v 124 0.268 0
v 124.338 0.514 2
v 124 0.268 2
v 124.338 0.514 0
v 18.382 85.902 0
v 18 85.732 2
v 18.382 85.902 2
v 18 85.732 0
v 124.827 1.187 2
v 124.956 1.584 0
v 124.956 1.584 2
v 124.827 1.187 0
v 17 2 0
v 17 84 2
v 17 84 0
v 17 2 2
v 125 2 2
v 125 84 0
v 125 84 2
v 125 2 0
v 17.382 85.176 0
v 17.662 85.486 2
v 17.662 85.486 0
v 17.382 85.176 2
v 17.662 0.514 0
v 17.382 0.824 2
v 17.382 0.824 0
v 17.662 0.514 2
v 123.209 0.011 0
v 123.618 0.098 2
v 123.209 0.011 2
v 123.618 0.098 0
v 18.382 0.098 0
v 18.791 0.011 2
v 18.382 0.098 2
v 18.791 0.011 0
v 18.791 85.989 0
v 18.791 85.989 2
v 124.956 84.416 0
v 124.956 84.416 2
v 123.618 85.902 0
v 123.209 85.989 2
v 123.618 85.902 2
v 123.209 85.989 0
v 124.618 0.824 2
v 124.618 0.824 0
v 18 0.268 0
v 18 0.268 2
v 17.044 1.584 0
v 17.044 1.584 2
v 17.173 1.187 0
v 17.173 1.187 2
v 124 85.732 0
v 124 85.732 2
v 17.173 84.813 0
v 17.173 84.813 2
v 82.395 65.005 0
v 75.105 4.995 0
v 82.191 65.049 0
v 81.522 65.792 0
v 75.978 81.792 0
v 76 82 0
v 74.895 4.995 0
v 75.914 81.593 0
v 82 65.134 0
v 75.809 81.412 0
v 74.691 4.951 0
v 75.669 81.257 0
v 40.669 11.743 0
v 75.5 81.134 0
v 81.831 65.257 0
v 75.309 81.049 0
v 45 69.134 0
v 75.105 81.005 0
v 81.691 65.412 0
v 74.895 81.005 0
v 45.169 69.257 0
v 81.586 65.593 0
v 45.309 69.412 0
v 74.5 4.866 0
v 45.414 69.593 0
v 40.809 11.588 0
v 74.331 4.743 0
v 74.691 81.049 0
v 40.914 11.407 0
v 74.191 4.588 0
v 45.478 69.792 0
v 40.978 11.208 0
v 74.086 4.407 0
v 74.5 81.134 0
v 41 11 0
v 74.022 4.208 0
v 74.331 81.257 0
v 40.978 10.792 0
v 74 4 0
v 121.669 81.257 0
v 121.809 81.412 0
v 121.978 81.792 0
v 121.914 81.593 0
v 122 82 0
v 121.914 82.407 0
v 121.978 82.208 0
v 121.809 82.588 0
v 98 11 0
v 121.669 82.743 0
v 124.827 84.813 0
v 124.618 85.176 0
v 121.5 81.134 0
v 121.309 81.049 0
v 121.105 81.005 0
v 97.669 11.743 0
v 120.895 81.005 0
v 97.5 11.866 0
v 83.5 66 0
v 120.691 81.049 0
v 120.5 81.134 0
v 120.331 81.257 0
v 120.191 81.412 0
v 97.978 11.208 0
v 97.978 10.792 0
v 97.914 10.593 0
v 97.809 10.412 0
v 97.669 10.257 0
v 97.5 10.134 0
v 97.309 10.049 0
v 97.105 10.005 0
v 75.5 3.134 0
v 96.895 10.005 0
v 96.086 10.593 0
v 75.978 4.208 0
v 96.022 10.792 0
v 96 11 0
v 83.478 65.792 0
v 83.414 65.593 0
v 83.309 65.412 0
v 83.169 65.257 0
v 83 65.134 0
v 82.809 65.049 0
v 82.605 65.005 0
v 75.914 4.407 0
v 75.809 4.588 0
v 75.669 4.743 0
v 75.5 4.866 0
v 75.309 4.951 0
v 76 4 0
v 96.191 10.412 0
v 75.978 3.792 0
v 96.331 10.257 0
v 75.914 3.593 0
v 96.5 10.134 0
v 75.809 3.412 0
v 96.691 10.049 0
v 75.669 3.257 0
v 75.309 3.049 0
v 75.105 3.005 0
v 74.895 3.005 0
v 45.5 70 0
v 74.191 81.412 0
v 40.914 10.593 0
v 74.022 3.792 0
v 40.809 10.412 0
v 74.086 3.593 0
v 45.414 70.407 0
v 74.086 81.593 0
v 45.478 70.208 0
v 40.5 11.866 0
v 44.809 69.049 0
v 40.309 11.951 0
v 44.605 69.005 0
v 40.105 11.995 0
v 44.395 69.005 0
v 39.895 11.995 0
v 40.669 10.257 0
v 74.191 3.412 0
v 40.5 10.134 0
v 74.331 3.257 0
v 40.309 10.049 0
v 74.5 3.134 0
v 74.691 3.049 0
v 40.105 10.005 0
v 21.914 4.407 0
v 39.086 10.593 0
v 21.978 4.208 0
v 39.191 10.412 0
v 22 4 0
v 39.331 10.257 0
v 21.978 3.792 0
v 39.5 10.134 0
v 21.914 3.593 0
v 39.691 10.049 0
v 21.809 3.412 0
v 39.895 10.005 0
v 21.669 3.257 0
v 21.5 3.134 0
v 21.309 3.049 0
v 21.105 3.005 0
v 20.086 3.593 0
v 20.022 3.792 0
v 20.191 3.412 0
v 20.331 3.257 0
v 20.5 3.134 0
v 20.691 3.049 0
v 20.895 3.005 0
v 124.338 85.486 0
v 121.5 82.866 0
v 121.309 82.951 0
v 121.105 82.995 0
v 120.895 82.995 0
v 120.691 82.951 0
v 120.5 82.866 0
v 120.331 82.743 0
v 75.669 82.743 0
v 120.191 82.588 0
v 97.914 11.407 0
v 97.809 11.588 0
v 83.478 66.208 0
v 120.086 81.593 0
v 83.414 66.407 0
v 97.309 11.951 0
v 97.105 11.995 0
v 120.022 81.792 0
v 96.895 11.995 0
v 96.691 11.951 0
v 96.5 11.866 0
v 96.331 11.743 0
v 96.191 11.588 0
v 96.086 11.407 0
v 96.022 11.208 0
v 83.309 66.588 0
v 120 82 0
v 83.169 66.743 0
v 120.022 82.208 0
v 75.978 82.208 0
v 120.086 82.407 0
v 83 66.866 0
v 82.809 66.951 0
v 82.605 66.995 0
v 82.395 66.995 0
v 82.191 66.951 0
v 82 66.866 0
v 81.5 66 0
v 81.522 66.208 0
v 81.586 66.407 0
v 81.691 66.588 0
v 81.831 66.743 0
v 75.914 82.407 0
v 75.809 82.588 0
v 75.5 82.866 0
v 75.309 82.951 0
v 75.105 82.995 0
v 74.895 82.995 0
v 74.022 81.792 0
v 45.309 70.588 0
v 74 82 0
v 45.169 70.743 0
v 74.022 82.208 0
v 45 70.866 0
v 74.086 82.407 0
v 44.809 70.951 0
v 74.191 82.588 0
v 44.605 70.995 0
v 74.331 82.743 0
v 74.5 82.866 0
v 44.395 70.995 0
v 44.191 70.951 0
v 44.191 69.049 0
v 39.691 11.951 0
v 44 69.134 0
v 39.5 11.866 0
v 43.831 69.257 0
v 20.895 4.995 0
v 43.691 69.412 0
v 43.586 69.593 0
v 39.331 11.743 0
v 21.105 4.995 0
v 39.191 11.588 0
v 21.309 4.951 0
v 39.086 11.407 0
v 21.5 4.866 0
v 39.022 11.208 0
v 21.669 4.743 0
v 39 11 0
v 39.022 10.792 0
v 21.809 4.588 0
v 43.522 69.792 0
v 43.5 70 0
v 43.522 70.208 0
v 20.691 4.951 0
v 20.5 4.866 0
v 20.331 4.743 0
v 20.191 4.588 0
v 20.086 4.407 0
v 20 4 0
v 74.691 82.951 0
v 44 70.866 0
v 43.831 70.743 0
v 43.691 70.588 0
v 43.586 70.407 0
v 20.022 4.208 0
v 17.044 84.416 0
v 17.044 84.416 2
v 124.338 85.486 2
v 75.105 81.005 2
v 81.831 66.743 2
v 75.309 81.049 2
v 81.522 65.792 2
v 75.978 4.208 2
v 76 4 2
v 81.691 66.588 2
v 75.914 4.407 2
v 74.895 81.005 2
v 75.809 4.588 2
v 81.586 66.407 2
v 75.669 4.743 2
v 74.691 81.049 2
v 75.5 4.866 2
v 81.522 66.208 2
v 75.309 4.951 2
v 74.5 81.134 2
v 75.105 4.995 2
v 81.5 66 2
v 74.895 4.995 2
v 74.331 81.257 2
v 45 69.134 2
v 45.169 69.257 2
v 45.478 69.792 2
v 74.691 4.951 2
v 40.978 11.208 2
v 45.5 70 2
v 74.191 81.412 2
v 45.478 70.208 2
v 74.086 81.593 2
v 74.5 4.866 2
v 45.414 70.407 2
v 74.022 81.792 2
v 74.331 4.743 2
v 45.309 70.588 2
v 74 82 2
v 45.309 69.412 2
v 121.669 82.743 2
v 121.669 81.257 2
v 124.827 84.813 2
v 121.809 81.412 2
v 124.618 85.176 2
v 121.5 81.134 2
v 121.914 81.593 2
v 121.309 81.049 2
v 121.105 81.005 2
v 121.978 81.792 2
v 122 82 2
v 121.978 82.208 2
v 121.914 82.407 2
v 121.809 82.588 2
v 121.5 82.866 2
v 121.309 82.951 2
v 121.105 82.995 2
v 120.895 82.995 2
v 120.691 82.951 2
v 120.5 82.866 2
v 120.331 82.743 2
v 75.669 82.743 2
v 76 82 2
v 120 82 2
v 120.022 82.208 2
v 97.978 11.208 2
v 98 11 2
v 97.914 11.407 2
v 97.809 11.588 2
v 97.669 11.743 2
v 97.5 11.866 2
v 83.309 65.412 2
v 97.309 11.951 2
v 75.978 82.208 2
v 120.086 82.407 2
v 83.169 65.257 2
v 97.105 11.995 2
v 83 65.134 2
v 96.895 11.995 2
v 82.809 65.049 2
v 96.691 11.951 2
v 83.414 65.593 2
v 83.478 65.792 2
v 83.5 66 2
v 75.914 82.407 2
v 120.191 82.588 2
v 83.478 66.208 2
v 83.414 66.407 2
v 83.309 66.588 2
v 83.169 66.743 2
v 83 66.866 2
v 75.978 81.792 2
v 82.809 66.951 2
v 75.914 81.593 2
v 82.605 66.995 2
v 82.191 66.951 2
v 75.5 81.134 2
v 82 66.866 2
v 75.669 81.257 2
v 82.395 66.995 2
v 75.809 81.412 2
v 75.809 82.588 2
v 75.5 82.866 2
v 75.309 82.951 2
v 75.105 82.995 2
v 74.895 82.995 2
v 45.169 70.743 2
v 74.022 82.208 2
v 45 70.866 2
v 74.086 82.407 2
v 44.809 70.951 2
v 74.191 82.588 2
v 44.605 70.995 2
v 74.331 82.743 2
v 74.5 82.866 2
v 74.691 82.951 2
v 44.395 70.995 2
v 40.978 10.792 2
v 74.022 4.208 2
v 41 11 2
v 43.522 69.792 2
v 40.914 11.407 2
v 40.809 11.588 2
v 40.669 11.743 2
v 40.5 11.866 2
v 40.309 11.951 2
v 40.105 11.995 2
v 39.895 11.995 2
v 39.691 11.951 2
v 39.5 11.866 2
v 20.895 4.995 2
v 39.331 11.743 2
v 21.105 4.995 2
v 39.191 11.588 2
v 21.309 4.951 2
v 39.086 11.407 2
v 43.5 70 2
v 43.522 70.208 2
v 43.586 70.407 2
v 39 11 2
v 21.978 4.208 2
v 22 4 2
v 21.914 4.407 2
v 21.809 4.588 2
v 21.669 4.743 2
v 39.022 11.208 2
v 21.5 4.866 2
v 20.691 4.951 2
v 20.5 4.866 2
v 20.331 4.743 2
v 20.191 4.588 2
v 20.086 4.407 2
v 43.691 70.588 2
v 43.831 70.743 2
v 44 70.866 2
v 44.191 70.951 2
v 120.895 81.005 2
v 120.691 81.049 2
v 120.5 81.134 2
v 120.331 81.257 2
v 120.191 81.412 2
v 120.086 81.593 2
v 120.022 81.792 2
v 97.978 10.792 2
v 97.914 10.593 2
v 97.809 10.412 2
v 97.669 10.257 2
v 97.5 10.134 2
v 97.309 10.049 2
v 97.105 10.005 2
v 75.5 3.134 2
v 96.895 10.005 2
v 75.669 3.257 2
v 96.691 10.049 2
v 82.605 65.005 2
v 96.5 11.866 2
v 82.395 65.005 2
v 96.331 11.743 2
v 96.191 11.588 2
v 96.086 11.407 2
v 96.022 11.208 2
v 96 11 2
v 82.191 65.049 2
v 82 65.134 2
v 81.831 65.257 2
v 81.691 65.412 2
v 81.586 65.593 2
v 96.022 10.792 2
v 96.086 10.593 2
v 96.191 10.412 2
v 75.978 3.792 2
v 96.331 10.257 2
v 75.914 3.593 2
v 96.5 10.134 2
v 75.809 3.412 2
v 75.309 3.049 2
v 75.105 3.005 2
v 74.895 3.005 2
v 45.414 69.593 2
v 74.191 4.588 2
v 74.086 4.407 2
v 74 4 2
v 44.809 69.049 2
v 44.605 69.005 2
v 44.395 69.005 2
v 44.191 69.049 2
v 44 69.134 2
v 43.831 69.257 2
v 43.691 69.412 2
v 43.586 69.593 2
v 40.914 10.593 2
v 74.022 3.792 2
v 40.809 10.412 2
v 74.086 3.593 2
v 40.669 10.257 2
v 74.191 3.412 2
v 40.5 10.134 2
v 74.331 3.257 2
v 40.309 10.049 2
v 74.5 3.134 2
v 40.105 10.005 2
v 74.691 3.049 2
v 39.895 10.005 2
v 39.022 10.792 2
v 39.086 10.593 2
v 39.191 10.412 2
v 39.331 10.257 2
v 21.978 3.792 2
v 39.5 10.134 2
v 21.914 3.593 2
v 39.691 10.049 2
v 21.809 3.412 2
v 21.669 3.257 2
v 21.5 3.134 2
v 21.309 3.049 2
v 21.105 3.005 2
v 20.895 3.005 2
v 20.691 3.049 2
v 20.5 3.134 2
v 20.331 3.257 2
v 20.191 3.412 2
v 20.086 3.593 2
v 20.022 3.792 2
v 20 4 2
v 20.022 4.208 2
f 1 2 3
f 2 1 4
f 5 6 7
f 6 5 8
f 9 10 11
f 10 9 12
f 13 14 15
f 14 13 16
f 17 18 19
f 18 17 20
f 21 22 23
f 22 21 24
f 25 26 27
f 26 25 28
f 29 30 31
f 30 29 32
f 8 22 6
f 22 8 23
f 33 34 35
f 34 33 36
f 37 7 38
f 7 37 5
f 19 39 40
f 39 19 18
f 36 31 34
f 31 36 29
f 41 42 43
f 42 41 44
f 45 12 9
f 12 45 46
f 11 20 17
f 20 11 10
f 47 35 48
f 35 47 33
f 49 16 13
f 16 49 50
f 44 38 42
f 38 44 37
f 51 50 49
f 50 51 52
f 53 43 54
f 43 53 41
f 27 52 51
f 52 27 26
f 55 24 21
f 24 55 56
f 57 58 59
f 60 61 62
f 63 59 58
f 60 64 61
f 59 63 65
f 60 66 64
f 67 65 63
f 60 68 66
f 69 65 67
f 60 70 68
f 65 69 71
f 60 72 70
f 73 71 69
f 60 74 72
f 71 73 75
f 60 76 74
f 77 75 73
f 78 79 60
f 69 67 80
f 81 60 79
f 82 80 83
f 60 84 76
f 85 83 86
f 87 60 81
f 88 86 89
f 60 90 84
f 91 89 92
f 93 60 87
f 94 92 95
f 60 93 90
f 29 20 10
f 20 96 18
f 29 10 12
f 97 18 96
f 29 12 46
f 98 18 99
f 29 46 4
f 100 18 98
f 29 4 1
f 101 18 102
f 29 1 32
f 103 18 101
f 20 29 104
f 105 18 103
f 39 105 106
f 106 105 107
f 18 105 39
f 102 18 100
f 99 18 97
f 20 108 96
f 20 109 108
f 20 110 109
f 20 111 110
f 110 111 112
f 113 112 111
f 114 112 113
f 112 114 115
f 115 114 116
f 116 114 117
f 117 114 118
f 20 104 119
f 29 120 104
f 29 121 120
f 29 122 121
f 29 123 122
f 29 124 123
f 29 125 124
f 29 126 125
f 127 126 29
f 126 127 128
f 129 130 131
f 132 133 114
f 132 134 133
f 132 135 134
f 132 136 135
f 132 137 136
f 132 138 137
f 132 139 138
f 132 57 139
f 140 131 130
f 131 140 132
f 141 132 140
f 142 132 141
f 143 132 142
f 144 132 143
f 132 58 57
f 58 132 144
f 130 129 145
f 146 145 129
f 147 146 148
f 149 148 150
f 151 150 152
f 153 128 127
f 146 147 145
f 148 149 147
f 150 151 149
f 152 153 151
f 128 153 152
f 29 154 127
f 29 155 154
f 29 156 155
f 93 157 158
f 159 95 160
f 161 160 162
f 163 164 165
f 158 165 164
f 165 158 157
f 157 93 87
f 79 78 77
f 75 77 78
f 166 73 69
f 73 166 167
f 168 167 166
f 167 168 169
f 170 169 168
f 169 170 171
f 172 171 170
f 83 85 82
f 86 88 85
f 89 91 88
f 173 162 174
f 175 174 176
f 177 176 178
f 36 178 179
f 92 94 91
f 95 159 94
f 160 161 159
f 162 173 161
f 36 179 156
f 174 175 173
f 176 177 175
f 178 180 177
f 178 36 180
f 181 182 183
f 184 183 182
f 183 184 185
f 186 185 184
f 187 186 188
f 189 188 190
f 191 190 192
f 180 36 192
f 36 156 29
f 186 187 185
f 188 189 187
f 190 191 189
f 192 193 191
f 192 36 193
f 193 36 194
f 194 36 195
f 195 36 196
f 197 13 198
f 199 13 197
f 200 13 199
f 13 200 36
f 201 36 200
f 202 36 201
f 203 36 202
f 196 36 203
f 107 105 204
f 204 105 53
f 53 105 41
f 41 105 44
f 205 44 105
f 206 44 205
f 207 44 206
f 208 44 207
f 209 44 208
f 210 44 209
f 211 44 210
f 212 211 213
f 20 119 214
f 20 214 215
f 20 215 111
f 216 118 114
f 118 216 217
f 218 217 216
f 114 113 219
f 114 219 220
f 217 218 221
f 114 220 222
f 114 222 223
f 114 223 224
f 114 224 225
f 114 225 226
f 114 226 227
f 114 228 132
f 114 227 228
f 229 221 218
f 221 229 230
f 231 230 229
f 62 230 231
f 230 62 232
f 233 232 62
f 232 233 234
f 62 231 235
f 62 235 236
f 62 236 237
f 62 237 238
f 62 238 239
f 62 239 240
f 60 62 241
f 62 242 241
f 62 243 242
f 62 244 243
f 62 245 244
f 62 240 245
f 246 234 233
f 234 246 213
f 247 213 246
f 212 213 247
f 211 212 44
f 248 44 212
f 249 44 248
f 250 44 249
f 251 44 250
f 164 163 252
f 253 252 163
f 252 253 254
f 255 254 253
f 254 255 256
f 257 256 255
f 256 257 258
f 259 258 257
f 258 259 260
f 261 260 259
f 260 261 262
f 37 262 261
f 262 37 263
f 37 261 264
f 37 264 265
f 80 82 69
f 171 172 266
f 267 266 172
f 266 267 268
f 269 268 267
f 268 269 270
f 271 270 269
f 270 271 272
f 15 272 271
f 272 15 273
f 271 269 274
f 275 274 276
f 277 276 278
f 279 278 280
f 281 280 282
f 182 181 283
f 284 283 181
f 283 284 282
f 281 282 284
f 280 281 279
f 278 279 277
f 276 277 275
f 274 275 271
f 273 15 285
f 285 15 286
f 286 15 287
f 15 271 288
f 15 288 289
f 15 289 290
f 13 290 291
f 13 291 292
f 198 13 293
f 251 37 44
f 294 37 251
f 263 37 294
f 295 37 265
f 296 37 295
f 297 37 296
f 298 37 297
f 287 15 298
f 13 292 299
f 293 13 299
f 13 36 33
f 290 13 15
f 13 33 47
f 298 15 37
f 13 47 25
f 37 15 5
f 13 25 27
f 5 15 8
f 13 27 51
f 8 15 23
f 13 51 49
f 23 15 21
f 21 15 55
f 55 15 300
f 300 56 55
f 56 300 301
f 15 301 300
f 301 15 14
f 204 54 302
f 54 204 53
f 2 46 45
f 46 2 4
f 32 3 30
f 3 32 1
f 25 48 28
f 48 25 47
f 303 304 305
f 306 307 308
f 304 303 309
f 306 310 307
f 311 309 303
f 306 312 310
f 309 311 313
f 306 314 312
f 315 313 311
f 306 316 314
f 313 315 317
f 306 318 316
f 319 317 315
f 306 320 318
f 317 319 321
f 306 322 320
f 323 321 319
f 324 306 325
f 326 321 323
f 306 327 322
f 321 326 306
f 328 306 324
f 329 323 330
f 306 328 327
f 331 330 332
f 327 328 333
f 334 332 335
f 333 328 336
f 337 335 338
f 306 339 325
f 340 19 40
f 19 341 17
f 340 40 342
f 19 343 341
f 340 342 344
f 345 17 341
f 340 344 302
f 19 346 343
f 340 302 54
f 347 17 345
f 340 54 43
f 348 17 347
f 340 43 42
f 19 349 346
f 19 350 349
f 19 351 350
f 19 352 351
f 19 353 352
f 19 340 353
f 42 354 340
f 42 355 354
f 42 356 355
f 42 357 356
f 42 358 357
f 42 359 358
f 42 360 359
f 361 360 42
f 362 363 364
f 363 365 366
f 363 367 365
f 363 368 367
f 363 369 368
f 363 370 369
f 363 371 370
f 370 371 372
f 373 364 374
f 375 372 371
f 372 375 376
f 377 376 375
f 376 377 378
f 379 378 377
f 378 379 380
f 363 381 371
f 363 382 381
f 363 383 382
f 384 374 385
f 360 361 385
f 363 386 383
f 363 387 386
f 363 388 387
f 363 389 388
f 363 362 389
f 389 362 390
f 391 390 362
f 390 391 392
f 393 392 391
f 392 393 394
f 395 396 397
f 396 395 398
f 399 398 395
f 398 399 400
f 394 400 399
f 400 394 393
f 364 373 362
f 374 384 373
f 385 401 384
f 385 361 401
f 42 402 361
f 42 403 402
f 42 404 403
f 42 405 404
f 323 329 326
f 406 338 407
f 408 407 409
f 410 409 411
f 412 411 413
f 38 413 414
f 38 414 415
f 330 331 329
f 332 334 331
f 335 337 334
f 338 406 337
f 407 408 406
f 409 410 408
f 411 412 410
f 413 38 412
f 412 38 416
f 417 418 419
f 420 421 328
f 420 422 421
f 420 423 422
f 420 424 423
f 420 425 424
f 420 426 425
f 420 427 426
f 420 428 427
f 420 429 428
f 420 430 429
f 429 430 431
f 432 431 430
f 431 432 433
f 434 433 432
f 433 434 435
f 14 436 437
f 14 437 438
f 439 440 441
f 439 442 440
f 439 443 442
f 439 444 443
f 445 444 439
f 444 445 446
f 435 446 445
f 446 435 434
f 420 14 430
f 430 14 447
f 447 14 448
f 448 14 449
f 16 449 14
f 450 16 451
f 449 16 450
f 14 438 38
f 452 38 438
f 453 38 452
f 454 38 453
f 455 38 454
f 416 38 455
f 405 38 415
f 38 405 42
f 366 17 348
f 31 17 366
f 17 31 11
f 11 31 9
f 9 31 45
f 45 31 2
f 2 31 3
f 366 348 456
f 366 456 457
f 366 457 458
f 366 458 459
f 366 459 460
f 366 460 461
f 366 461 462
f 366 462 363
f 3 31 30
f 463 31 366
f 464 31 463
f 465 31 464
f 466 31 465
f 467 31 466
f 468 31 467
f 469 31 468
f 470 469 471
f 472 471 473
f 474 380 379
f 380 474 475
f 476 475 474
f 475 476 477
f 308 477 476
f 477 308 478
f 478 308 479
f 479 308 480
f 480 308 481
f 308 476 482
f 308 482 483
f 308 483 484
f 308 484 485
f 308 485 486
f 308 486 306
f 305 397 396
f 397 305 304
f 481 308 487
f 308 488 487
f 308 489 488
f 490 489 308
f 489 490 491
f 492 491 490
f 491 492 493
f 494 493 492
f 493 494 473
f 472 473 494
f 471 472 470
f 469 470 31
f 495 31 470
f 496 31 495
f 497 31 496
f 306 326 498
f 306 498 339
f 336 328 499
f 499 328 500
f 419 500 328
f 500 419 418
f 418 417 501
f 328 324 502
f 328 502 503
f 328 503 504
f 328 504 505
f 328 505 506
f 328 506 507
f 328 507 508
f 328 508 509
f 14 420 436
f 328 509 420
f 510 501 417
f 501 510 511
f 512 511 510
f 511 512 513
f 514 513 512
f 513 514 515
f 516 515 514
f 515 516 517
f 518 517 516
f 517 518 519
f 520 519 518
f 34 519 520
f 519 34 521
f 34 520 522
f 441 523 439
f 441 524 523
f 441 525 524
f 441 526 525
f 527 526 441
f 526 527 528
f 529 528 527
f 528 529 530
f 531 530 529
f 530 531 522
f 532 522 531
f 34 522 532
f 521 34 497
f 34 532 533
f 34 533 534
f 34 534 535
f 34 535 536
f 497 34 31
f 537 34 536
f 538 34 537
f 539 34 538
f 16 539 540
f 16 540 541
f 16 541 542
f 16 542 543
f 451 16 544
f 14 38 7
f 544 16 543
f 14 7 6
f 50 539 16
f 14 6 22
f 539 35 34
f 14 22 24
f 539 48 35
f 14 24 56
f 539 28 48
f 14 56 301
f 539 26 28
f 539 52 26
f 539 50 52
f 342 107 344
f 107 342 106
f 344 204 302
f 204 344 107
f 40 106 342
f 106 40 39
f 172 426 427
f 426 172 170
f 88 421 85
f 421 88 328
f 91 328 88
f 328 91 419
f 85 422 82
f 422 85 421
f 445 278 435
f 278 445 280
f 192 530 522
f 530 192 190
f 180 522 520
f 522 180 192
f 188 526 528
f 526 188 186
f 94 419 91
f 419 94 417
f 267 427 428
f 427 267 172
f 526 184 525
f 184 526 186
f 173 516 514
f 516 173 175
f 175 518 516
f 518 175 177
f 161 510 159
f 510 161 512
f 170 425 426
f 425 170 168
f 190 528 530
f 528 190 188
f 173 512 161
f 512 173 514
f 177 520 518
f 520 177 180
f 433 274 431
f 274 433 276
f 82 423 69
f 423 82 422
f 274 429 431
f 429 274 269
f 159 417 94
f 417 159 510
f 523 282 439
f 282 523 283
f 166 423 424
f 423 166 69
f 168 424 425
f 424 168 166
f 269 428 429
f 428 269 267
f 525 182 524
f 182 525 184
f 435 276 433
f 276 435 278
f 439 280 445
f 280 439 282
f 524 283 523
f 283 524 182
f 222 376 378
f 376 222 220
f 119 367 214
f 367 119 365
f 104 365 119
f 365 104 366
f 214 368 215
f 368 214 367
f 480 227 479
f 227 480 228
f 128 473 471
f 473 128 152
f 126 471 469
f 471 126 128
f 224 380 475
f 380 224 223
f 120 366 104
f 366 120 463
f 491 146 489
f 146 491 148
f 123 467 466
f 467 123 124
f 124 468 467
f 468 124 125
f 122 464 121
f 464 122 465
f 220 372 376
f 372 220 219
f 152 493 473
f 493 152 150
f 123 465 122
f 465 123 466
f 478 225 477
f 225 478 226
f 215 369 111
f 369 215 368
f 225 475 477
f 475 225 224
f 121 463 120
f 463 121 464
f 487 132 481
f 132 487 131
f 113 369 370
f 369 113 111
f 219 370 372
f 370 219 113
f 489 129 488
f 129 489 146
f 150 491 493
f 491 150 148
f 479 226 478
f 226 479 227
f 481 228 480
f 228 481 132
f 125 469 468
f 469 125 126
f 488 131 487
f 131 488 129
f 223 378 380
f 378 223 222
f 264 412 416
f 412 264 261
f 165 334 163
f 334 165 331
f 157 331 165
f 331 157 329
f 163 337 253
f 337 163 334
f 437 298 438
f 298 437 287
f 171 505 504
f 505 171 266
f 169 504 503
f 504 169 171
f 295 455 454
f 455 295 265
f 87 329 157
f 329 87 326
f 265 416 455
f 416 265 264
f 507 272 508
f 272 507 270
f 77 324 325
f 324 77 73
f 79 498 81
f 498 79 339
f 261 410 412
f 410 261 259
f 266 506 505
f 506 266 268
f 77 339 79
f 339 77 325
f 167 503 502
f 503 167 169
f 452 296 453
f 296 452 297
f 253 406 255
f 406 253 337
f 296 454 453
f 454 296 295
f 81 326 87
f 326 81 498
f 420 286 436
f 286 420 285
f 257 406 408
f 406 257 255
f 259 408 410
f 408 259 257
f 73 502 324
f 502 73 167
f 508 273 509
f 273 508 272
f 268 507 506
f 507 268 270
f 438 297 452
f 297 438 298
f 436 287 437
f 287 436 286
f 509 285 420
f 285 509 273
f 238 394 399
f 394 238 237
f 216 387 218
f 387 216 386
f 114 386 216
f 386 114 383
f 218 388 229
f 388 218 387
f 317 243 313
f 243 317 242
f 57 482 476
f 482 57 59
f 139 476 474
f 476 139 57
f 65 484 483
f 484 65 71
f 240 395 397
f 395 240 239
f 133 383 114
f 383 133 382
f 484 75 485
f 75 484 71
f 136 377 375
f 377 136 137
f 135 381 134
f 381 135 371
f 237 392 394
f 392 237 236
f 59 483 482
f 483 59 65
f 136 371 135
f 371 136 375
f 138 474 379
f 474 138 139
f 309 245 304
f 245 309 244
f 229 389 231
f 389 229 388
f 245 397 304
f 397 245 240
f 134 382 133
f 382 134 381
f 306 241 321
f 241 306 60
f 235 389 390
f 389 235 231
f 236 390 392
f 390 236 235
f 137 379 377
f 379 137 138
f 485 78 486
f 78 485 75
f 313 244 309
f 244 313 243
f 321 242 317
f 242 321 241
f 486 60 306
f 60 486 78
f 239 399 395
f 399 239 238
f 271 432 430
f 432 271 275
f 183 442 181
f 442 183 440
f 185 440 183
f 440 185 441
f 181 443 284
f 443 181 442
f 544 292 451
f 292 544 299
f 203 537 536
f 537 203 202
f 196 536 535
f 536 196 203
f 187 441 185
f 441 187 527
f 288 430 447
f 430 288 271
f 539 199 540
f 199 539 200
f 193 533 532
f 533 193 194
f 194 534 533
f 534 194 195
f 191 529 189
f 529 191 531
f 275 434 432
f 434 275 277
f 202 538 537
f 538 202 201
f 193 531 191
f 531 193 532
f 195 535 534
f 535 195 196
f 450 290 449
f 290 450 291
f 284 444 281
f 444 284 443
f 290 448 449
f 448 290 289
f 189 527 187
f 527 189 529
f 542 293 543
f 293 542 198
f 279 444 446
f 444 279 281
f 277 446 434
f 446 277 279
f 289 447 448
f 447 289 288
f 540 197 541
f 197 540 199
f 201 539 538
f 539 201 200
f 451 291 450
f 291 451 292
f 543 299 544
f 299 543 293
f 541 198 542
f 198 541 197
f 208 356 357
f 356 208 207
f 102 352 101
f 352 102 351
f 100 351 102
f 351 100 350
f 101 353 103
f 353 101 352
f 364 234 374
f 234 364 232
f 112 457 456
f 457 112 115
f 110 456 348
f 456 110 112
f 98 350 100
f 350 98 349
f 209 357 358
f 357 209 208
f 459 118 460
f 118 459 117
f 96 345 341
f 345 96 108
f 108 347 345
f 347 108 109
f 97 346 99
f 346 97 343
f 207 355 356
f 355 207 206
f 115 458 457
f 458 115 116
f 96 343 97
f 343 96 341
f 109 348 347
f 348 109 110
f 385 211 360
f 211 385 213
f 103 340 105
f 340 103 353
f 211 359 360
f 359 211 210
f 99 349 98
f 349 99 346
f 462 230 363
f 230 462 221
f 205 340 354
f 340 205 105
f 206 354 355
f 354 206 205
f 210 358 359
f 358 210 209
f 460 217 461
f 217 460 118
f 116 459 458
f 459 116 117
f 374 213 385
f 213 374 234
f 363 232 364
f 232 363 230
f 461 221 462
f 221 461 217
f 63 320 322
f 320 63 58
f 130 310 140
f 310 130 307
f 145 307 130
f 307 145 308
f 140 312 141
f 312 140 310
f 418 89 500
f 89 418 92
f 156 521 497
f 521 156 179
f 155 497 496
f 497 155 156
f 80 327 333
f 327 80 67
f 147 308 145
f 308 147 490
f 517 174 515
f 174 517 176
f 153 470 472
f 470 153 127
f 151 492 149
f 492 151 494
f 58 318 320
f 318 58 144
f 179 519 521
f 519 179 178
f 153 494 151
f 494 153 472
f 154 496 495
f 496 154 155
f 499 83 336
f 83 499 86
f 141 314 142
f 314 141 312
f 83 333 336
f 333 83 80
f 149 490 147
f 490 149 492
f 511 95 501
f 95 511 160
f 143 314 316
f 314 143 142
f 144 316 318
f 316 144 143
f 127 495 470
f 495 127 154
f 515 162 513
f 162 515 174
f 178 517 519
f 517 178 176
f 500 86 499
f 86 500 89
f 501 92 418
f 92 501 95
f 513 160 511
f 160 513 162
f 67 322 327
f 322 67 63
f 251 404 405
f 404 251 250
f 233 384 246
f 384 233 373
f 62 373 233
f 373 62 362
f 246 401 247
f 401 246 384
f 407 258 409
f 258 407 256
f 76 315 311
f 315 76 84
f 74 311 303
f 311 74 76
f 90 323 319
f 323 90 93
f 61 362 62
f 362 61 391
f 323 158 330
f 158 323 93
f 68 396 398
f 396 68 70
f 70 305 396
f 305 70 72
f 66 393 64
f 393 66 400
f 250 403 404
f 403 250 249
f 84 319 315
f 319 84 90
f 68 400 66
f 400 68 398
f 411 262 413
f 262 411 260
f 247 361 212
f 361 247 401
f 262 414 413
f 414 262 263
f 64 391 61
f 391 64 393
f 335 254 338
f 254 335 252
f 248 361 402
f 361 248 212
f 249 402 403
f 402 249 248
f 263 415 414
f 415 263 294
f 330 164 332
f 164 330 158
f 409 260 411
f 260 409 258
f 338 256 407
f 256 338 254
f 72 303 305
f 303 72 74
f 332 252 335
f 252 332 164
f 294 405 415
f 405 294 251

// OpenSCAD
$fs = 0.1;
height = 1;

// 縦、幅+3mmずつ + minkowskiで+2mm = 5mm?

module tri(h) {
    polyhedron([[0, 0, 0], [0, 82, 0], [-17, 82, 0], [-17, 82, h], [0, 82, h], [0, 0, h]],
    [[0, 1, 2], [5, 4, 3], [0, 2, 3, 5], [0, 1, 4, 5], [1, 2, 3, 4]]);
};

module hole(x, y, h) {
    translate([x, y, 0])
        cylinder(r=1, h=h+1);
};

module cherry_hole(x, y, h) {
    translate([x, y, 0])
        cube([14, 14, h+1]);
}

translate([19, 2, 0])
    difference() {
        minkowski() {
            union() {
                    cube([104, 82, height]);
                    tri(height);
                    rotate([180, 180, 0])
                        translate([-104, -82, 0])
                            tri(height);
            };
            cylinder(r=2, h=height);
        };
        
        //基板
        hole(19+2, 7+2, height);
        hole(76+2, 7+2, height);
        hole(23.5+2, 66+2, height);
        hole(61.5+2, 104-38-2, height);
        
        //外周
        hole(2, 2, height);
        hole(104-2, 82-2, height);
        hole(2-17, 82-2, height);
        hole(104+17-2, 2, height);
        hole(109+2, 41-2, height);
        hole(2-8, 41-2, height);
        hole(54+2, 2, height);
        hole(54+2, 82-2, height);
    };
